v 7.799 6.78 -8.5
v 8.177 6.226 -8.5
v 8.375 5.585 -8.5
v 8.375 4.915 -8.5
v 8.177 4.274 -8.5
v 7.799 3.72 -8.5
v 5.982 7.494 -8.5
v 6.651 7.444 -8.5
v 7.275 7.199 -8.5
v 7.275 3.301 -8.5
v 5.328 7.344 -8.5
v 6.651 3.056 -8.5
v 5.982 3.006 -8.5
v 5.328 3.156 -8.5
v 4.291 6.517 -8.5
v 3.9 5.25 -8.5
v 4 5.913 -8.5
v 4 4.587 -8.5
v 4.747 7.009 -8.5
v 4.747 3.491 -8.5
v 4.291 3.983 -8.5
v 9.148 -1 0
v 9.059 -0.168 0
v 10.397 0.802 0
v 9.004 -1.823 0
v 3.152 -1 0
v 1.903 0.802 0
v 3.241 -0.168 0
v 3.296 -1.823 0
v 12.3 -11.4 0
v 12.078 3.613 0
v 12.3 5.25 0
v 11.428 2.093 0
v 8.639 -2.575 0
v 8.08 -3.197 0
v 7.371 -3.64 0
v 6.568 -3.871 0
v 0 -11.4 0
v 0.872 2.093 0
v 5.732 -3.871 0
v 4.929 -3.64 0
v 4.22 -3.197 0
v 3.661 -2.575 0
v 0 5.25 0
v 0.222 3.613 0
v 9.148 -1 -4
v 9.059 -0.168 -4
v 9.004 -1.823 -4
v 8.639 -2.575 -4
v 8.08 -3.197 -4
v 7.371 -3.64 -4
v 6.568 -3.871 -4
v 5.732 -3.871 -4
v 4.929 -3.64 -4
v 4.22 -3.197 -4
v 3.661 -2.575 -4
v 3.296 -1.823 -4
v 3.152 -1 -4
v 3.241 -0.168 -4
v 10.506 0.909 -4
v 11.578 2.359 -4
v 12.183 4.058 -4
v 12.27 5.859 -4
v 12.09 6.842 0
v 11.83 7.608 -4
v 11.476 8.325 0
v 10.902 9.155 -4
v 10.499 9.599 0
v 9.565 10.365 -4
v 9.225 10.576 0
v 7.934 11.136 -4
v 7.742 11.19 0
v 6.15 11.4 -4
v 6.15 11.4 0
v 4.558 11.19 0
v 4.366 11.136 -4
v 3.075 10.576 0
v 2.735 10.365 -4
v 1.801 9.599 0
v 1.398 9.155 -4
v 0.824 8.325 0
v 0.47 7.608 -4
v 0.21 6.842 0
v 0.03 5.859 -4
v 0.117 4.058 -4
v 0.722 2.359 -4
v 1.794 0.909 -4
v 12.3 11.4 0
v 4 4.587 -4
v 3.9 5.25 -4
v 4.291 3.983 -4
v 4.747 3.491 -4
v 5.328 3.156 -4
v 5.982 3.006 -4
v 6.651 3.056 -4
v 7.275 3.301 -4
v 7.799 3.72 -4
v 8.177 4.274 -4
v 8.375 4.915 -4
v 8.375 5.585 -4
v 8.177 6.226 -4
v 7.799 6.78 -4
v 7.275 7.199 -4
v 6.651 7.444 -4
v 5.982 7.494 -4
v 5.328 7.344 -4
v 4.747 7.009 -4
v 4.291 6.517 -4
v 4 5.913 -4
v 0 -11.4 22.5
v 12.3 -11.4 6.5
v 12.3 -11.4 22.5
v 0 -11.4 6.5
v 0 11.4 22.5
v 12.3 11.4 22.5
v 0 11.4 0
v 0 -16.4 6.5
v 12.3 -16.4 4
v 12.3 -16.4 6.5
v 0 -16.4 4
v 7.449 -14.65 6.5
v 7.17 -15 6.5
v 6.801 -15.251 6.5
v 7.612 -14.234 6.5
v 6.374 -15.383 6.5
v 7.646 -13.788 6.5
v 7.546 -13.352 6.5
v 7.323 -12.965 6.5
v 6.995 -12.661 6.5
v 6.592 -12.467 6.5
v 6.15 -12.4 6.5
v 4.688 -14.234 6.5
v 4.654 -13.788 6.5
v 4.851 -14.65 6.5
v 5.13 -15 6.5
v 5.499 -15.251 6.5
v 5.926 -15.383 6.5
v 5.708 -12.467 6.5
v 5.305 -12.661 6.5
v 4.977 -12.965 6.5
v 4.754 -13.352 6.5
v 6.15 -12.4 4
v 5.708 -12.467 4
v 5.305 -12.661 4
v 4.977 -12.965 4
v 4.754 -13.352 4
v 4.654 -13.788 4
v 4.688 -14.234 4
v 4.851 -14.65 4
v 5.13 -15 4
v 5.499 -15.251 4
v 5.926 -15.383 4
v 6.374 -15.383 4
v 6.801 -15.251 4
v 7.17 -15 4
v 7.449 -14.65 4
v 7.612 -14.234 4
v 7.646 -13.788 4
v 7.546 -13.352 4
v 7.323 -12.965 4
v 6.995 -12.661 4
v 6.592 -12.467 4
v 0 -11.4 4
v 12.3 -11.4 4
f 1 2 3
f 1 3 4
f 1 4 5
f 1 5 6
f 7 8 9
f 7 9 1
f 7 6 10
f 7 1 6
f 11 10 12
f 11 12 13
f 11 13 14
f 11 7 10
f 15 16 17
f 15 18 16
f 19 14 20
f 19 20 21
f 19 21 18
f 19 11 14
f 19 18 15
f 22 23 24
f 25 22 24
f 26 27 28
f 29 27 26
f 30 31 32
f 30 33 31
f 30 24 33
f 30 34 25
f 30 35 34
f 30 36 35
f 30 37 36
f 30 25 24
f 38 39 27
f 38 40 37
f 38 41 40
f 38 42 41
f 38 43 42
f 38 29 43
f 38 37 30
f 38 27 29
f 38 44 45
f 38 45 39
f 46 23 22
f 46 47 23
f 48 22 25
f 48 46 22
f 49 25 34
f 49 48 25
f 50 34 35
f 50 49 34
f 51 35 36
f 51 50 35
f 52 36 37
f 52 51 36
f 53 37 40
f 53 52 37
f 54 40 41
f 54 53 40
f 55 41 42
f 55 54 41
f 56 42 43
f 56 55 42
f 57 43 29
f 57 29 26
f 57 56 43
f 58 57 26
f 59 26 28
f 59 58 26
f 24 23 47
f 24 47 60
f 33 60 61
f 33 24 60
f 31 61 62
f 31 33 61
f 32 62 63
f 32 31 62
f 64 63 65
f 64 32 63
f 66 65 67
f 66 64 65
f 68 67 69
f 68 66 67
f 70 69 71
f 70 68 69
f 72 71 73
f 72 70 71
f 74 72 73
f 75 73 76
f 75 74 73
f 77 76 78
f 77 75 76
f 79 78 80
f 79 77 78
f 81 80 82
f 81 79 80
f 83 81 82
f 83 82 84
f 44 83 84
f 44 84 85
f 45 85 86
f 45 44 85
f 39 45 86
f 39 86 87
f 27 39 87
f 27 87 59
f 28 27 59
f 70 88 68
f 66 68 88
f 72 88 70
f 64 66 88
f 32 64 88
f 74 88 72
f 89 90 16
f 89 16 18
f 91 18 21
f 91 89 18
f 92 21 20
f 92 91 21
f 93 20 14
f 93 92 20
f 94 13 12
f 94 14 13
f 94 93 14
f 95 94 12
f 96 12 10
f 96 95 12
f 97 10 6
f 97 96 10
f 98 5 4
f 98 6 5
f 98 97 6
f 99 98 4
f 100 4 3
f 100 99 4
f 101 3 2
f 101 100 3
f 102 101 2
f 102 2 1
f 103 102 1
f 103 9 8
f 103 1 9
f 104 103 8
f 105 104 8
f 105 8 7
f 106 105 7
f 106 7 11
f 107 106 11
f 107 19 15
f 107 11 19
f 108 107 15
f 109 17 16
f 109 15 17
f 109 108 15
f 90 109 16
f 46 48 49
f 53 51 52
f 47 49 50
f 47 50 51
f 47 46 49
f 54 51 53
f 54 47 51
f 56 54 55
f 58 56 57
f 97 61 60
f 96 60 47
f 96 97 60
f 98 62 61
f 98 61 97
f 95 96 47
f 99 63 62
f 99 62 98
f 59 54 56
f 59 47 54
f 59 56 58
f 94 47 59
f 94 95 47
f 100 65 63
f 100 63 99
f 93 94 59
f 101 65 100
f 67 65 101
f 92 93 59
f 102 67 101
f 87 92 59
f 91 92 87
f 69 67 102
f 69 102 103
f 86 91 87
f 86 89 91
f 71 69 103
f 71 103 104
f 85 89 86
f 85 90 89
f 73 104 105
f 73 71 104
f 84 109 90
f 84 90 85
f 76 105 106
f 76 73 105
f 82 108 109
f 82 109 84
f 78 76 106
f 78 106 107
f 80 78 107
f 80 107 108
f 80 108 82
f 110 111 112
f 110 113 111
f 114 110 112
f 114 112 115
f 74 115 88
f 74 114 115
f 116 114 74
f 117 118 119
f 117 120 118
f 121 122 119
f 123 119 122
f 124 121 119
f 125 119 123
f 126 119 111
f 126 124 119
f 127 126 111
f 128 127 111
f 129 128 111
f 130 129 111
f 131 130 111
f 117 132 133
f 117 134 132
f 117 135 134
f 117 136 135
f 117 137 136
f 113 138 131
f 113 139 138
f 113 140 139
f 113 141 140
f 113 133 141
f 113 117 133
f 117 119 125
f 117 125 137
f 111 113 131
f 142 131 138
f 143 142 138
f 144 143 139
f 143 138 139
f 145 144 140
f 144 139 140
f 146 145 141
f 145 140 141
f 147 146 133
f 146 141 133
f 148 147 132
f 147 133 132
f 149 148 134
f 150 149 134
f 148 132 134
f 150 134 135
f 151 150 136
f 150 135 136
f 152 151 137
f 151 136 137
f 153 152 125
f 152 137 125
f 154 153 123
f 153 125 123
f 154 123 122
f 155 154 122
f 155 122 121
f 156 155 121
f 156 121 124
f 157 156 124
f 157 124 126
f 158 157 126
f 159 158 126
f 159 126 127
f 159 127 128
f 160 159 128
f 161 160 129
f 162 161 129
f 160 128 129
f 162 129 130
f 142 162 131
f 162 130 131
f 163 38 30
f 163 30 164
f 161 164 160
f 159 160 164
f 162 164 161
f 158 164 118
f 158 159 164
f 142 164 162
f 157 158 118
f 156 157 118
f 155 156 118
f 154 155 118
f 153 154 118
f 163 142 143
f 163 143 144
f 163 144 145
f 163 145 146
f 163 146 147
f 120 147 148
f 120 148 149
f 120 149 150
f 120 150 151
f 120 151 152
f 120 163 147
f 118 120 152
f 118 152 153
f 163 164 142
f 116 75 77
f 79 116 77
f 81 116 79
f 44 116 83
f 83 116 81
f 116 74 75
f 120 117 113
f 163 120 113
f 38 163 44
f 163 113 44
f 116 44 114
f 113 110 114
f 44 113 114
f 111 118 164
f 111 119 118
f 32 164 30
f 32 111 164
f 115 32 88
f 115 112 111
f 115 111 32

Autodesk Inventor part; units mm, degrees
ref_plane "YZ Plane" through (0, 0, 0) normal (1, 0, 0) x (0, 1, 0)
ref_plane "XZ Plane" through (0, 0, 0) normal (0, 1, 0) x (-1, 0, 0)
ref_plane "XY Plane" through (0, 0, 0) normal (0, 0, 1) x (1, 0, 0)
sketch "Skizze1" plane through (0, 0, 0) normal (1, 0, 0) x (0, 1, 0)
  line L0 (11.4, 22.5) -> (11.4, 6.5)
  line L1 (11.4, 6.5) -> (16.4, 6.5)
  line L2 (16.4, 6.5) -> (16.4, 4)
  line L3 (16.4, 4) -> (11.4, 4)
  line L4 (11.4, 4) -> (11.4, 0)
  line L5 (11.4, 0) -> (0, 0)
  line L6 (0, 0) -> (0, 22.5)
  line L7 (0, 22.5) -> (11.4, 22.5)
  dimension "d0" = 2.5
  dimension "d1" = 5
  dimension "d2" = 4
  dimension "d3" = 16
  dimension "d4" = 11.4
extrude "Extrusion1" add sketch "Skizze1" along normal blind 12.3
mirror "Spiegeln1" about plane through (0, 0, 22.5) normal (0, -1, 0) of "Extrusion1"
sketch "Skizze2" plane through (12.3, 11.4, 0) normal (0, 0, -1) x (-1, 0, 0)
  circle A0 centre (6.15, -6.15) radius 6.15
  line L0 (12.3, 0) -> (0, 0) projected
  line L1 (6.15, 0) -> (6.15, -6.15) construction
  line L2 (6.15, -6.15) -> (12.3, -6.15) construction
  line L3 (12.3, 0) -> (12.3, -22.8) construction
  point P0 (12.3, -11.4)
extrude "Extrusion2" add sketch "Skizze2" along normal blind 4
sketch "Skizze3" plane through (6.15, 5.25, -4) normal (0, 0, -1) x (-1, 0, 0)
  arc A0 (-6.15, 0) -> (6.15, 0) centre (0, 0) ccw projected
  arc A1 (-2.9094, -5.4183) -> (2.9094, -5.4183) centre (0, -6.15) ccw
  point P0 (6.15, -5.25)
  dimension "d9" = 6
extrude "Extrusion3" add sketch "Skizze3" against normal up to surface (4 mm away)
sketch "Skizze4" plane through (0, 11.4, 4) normal (0, 0, -1) x (-1, 0, 0)
  line L0 (-12.3, -22.8) -> (-12.3, -27.8) projected
  line L1 (-12.3, 0) -> (-12.3, 5) projected
  line L2 (0, 5) -> (-12.3, 5) projected
  point P0 (0, -11.4)
  point P1 (-6.15, 2.5)
  point P2 (-6.15, -25.3)
  point P3 (-12.3, -25.3)
  point P4 (-12.3, 2.5)
  point P5 (-6.15, 5)
hole "Bohrung1" at (6.15, 13.9, 4) at (6.15, -13.9, 4) direction (0, 0, 1) diameter 3 end through all
sketch "Skizze5" plane through (12.3, 11.4, -4) normal (0, 0, -1) x (-1, 0, 0)
  circle A0 centre (6.15, -6.15) radius 2.25
  arc A1 (9.0594, -11.5683) -> (3.2406, -11.5683) centre (6.15, -6.15) ccw projected
  point P0 (12.3, -11.4)
  dimension "d19" = 4.5
extrude "Extrusion4" add sketch "Skizze5" along normal blind 4.5
sketch "Skizze6" plane through (0, 0, 0) normal (-1, 0, 0) x (0, 0, 1)
  line L0 (6.5, 11.4) -> (22.5, 11.4) projected
  line L1 (4, 16.4) -> (6.5, 16.4)
  line L2 (6.5, 16.4) -> (6.5, 11.4)
  line L3 (6.5, 11.4) -> (4, 11.4)
  line L4 (4, 11.4) -> (4, 16.4)
  point P0 (0, 0)
extrude "Extrusion5" cut sketch "Skizze6" against normal through all
properties part number "Motor"
